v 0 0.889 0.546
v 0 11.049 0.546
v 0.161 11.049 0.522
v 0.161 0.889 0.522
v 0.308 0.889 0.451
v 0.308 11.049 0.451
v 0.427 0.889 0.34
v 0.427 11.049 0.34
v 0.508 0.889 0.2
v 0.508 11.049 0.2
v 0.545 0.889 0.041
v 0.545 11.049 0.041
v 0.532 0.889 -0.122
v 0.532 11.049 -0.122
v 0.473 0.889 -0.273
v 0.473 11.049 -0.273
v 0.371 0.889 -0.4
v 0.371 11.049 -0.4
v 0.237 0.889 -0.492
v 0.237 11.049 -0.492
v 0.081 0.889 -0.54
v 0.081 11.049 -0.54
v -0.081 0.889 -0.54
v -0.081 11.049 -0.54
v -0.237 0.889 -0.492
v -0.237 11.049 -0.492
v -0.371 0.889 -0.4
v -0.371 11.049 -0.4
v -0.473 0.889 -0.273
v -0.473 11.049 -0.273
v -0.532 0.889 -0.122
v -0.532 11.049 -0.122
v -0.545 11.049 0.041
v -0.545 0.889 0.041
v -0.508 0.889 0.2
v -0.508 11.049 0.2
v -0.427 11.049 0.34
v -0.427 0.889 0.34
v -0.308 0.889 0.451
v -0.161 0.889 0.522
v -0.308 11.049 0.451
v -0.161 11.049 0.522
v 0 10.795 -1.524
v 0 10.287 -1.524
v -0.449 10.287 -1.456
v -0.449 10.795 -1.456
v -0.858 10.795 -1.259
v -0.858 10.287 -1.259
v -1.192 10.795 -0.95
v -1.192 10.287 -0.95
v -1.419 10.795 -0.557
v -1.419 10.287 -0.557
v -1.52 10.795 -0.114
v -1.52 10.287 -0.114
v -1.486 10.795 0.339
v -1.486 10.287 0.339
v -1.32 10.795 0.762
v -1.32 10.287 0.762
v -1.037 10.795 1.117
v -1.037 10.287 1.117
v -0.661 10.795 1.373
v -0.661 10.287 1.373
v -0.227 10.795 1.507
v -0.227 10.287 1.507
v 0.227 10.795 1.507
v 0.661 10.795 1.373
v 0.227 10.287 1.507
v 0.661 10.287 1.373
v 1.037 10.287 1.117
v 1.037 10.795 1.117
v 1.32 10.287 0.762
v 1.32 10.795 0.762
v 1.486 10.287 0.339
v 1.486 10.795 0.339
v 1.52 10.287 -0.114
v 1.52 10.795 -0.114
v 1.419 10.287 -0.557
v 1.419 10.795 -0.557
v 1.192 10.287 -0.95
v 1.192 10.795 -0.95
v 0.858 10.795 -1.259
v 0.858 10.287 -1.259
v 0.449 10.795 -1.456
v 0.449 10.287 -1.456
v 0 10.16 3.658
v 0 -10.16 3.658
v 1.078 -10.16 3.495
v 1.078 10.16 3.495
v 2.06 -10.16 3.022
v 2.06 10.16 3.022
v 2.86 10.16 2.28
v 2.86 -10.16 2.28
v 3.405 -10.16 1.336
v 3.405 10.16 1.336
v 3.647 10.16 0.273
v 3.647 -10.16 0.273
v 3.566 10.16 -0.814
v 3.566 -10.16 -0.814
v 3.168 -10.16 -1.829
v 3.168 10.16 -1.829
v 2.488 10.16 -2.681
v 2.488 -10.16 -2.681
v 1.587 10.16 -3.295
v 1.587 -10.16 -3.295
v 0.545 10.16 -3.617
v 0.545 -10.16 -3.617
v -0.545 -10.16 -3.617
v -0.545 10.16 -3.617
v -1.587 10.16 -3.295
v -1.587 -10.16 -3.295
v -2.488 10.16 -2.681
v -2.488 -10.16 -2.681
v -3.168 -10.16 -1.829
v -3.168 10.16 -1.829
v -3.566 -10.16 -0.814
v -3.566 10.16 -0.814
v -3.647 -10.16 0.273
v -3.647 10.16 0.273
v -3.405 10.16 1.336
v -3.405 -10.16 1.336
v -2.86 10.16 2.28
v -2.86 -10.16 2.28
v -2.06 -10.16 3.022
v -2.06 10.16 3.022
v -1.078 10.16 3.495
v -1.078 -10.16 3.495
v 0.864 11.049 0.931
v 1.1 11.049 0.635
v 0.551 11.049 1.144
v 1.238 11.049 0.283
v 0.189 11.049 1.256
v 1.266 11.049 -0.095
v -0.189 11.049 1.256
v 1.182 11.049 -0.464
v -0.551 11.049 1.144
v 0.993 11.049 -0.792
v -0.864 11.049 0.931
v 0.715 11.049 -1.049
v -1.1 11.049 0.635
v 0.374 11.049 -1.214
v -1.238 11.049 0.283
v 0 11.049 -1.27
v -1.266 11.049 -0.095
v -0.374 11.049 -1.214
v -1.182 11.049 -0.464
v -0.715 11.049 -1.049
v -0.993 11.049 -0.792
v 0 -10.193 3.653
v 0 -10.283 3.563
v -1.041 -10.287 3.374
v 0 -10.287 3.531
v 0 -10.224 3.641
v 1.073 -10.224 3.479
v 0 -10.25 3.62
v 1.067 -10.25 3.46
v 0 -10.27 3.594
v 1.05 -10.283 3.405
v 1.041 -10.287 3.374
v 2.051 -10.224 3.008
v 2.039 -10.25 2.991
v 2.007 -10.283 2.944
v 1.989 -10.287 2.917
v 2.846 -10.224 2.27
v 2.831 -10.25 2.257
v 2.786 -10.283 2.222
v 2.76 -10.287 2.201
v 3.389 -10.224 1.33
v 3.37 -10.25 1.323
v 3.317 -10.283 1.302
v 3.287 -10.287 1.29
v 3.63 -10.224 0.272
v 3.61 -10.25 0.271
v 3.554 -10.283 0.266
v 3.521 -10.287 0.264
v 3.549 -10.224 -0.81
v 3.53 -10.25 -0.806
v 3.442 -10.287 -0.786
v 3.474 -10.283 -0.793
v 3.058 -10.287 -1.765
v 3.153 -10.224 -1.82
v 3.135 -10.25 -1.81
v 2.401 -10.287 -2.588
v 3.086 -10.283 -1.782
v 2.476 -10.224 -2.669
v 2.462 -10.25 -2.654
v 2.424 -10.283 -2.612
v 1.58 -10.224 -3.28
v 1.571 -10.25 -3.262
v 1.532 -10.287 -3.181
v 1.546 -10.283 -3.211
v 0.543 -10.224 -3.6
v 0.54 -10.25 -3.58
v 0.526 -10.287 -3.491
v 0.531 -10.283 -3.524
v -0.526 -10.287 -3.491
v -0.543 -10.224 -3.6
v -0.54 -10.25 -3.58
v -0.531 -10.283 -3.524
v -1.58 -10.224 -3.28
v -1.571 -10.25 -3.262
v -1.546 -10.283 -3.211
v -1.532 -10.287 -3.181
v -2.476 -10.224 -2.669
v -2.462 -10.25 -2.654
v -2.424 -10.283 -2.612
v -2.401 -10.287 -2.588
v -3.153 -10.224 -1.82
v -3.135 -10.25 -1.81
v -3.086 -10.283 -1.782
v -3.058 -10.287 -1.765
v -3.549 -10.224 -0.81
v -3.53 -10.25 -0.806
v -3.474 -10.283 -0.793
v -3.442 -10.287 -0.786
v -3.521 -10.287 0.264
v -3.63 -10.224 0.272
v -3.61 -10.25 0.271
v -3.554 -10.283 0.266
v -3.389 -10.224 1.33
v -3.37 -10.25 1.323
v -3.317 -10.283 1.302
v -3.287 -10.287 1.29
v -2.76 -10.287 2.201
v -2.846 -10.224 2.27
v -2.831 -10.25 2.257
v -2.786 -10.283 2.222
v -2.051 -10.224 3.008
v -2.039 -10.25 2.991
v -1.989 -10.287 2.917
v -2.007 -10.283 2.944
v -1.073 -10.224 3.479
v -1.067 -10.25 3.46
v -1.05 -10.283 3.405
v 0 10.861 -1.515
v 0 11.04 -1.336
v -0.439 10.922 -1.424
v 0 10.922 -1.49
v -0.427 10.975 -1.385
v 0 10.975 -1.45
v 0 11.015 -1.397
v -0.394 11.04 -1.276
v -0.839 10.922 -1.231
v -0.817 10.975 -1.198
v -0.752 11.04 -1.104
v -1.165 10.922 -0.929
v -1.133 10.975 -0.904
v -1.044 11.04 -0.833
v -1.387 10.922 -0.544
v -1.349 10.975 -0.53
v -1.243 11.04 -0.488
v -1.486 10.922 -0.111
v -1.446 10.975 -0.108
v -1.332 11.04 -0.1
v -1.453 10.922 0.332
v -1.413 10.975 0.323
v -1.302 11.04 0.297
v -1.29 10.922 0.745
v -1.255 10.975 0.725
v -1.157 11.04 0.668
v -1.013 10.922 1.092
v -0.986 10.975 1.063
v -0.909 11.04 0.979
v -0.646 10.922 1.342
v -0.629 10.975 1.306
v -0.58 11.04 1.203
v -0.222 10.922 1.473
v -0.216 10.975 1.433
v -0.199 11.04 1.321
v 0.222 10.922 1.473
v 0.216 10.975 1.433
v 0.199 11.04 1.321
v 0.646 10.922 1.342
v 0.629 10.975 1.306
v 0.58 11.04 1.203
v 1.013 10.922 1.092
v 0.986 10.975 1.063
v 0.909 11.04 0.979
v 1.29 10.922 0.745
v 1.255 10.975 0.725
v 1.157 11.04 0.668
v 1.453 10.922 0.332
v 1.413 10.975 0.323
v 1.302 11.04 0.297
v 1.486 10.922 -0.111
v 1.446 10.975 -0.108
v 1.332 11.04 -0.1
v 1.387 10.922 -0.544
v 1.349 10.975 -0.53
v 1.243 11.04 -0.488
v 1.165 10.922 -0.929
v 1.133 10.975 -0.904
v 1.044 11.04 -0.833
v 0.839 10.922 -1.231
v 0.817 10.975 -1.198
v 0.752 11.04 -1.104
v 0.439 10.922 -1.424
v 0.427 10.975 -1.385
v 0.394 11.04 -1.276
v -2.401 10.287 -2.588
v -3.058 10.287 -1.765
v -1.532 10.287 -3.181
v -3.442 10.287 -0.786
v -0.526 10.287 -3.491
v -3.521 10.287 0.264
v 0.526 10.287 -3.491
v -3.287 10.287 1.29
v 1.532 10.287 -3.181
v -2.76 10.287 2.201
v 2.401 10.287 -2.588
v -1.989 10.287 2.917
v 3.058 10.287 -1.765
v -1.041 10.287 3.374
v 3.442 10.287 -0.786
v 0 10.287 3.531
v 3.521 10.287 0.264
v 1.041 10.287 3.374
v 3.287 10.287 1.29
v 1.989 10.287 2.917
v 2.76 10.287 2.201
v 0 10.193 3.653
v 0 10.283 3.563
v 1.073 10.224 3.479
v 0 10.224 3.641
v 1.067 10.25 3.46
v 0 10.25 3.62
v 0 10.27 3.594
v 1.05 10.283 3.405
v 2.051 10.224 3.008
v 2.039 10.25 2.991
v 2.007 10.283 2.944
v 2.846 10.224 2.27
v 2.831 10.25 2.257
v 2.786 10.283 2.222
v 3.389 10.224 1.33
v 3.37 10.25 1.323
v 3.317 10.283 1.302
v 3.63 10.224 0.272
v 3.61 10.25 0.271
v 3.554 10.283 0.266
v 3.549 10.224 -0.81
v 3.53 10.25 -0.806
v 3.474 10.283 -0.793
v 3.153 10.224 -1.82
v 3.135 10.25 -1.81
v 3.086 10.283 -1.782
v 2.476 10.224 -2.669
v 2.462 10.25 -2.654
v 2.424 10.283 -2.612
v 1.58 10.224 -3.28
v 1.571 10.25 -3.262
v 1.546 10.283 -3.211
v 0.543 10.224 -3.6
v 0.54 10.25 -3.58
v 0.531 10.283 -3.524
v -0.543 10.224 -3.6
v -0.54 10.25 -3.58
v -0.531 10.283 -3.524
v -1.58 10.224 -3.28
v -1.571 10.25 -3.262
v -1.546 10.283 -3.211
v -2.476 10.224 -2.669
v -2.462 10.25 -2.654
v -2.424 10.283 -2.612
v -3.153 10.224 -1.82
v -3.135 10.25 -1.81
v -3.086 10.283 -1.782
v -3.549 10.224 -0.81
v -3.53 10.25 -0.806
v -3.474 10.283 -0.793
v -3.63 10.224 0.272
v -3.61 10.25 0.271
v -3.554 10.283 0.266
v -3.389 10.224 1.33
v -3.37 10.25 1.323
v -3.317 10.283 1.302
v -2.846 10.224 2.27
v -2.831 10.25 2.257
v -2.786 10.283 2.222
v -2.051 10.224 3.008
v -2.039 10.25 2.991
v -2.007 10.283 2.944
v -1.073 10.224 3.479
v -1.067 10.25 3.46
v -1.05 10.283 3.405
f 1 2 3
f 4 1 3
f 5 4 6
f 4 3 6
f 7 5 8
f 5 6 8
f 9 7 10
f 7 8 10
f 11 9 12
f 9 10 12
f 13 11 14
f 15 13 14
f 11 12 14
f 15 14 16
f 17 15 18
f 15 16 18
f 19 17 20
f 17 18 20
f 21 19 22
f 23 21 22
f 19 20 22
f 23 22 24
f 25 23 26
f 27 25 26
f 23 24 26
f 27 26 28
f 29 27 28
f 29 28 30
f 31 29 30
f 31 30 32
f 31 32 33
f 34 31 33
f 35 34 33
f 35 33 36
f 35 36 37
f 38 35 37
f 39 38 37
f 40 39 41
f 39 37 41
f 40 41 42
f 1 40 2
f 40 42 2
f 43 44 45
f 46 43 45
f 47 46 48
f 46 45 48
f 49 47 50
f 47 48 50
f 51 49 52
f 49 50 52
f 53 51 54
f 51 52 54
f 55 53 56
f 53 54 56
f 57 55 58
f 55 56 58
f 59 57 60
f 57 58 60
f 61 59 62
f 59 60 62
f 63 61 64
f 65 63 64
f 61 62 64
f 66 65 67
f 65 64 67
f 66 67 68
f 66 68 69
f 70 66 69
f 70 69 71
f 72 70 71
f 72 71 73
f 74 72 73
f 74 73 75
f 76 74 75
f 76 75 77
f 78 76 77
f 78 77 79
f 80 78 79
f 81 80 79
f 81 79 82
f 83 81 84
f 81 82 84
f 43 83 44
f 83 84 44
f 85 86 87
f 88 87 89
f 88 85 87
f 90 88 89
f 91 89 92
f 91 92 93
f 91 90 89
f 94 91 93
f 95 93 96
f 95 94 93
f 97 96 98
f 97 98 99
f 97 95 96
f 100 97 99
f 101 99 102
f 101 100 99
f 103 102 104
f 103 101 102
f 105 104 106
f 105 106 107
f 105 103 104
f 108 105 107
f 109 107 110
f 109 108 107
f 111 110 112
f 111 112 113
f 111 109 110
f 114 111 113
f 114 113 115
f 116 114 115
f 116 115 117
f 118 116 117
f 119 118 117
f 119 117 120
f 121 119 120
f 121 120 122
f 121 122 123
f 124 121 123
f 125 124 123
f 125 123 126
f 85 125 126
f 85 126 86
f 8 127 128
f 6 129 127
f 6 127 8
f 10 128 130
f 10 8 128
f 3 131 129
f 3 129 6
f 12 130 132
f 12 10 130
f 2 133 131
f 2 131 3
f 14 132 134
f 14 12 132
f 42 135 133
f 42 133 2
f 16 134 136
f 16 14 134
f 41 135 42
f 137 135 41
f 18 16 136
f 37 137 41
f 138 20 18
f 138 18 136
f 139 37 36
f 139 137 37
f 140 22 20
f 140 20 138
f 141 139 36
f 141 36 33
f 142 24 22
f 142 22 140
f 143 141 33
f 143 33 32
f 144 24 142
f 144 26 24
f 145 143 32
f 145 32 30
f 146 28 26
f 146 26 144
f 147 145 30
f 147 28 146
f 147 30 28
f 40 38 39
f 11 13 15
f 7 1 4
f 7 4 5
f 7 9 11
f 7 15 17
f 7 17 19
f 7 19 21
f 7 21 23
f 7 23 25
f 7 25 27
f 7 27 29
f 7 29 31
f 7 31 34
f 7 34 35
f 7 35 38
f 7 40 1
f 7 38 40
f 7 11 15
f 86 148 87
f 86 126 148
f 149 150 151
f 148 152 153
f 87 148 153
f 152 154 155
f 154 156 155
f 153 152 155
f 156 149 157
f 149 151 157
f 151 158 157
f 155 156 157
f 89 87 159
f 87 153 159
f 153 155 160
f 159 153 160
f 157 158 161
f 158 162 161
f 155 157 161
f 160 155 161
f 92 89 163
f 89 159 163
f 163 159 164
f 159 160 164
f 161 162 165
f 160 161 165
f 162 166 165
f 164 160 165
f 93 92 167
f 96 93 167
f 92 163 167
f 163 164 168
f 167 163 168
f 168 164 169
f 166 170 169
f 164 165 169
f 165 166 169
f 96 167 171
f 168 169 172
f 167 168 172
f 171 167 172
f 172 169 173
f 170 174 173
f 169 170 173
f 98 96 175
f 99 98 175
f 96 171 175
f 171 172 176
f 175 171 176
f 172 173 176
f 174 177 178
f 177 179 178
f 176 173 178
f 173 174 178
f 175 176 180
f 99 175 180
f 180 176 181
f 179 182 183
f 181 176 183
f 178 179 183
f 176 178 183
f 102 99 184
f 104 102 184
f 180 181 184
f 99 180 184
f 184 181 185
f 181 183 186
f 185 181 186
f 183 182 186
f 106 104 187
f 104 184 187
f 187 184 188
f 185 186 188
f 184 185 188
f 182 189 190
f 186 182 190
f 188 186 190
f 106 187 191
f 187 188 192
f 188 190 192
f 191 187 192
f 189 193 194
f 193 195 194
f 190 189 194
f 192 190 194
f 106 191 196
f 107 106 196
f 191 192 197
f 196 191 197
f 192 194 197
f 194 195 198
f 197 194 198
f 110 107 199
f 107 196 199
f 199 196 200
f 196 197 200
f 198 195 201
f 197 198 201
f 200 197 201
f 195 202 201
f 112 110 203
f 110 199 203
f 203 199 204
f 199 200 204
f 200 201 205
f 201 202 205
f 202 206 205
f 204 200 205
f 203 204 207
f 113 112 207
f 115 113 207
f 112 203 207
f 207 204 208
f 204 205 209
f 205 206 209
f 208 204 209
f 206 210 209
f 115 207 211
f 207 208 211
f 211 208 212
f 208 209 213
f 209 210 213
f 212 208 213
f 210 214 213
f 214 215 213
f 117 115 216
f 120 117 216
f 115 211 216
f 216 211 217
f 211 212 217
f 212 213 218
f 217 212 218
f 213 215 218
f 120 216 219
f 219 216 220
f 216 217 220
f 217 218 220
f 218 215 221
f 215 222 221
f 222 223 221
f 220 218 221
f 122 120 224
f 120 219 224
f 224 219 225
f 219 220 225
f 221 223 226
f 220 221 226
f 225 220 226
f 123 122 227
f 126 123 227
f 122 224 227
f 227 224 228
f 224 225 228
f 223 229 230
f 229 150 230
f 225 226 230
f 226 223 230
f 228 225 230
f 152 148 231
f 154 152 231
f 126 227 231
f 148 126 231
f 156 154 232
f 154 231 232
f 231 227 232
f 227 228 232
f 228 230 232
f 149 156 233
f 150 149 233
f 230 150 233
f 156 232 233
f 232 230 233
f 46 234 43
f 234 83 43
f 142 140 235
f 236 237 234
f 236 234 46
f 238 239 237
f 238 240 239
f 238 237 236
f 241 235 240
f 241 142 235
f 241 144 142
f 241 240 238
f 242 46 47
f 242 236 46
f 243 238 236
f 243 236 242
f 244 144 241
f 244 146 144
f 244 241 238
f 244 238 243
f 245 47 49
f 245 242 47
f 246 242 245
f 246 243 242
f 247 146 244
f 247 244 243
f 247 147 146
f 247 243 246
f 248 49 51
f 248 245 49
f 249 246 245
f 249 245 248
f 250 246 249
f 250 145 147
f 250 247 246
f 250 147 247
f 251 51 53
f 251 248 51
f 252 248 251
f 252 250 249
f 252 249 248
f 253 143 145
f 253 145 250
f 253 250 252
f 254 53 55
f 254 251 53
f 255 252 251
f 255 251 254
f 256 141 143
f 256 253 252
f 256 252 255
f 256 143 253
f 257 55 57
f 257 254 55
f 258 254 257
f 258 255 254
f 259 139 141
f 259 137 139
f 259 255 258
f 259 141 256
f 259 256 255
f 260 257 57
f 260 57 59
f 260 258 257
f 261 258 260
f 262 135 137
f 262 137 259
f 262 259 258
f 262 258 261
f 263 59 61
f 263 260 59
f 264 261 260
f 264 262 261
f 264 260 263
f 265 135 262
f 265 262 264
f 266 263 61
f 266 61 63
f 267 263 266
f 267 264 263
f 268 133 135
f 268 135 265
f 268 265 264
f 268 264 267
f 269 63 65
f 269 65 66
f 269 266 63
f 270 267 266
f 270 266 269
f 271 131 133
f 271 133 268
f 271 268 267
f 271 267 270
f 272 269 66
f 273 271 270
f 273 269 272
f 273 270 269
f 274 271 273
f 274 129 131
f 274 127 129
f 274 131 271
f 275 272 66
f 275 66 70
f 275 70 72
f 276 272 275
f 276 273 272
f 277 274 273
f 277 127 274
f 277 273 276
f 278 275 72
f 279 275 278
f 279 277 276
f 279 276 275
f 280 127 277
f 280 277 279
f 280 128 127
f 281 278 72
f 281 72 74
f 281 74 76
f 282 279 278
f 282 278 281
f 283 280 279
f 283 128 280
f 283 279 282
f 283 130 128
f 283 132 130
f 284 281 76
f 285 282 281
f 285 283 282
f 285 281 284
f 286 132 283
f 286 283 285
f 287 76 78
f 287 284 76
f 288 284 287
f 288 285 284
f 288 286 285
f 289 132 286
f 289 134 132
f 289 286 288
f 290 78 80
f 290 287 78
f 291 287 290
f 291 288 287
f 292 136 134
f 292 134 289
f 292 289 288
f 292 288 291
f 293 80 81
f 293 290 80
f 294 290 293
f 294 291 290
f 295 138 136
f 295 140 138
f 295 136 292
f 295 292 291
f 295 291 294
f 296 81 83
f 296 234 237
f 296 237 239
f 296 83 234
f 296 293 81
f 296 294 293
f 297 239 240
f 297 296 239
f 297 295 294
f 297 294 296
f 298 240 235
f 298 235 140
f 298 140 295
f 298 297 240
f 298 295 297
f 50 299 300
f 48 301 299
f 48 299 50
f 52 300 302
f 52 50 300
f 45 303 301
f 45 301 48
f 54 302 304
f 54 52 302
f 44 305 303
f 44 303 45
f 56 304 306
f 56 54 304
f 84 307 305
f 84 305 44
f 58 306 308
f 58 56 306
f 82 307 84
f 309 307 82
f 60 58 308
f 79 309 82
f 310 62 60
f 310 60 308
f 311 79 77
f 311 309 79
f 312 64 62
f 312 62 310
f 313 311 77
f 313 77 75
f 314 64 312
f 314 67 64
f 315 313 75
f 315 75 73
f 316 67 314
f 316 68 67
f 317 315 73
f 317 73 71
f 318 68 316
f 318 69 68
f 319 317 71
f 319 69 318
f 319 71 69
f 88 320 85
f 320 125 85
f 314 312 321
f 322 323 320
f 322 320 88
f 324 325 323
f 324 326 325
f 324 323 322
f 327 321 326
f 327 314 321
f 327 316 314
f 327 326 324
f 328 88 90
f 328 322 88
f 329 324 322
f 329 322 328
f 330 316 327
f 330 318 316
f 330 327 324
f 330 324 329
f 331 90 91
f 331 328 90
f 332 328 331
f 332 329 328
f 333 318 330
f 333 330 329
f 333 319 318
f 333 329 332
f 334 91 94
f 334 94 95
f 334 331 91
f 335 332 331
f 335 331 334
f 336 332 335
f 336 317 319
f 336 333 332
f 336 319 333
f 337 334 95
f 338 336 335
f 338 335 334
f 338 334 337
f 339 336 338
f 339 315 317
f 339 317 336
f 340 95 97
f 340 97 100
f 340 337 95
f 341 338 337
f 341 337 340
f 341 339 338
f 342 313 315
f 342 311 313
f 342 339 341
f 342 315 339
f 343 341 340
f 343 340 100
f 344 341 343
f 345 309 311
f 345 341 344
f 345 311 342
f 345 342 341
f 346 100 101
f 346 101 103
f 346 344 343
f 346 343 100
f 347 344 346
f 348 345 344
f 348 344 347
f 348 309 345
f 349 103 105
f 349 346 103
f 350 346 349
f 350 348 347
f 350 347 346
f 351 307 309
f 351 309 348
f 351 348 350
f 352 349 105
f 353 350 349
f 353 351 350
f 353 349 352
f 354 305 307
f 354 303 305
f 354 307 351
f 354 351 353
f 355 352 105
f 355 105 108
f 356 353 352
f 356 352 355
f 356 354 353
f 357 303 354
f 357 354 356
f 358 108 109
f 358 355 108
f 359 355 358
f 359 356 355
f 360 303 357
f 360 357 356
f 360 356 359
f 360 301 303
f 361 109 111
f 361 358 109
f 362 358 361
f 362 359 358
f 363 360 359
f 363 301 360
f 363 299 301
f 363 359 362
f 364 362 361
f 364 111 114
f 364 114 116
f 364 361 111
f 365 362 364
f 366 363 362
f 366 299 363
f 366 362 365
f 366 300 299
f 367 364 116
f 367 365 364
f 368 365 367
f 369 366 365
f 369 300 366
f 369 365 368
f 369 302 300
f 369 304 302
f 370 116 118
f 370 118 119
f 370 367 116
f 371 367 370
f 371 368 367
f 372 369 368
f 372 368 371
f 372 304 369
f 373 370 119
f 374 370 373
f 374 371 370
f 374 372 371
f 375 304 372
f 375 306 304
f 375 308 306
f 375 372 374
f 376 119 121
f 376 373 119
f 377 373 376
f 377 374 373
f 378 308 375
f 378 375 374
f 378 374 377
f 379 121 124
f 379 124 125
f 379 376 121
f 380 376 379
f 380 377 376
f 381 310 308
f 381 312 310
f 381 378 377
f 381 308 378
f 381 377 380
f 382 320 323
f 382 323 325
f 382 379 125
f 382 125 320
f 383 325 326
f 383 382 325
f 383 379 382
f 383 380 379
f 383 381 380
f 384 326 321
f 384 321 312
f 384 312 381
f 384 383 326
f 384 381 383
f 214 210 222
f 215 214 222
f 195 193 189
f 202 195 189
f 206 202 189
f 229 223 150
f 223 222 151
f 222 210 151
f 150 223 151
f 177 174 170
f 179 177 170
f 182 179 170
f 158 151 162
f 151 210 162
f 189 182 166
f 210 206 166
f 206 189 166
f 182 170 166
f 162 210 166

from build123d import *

# Parameters (mm, degrees)
SKETCH1_R           = 3.6576
BOSS_EXTRUDE1_DEPTH = 10.287
FILLET1_R           = 0.127
SKETCH2_R           = 1.524
BOSS_EXTRUDE2_DEPTH = 0.762
FILLET2_R           = 0.254
SKETCH3_R           = 0.5461
CUT_EXTRUDE1_DEPTH  = 10.16


with BuildPart() as part:
    # Sketch1 → Boss-Extrude1 (new, symmetric)
    with BuildSketch(Plane(origin=(0, 0, 0), x_dir=(1, 0, 0), z_dir=(0, 1, 0))):
        with Locations(Location((0, 0, 0), (0, 0, 270))):
            Circle(SKETCH1_R)
    extrude(amount=BOSS_EXTRUDE1_DEPTH, both=True)

    # Fillet1
    fillet1_edges = [part.edges().sort_by_distance(p)[0] for p in [
        (0, -10.287, -3.6576),
        (0, 10.287, -3.6576),
    ]]
    fillet(fillet1_edges, radius=FILLET1_R)

    # Sketch2 → Boss-Extrude2 (add)
    with BuildSketch(Plane(origin=(0, 10.287, 0), x_dir=(1, 0, 0), z_dir=(0, 1, 0))):
        with Locations(Location((0, 0, 0), (0, 0, 90))):
            Circle(SKETCH2_R)
    extrude(amount=BOSS_EXTRUDE2_DEPTH)

    # Fillet2
    fillet2_edges = [part.edges().sort_by_distance(p)[0] for p in [
        (0, 11.049, 1.524),
    ]]
    fillet(fillet2_edges, radius=FILLET2_R)

    # Sketch3 → Cut-Extrude1 (cut)
    with BuildSketch(Plane(origin=(0, 11.049, 0), x_dir=(1, 0, 0), z_dir=(0, 1, 0))):
        with Locations(Location((0, 0, 0), (0, 0, 270))):
            Circle(SKETCH3_R)
    extrude(amount=-CUT_EXTRUDE1_DEPTH, mode=Mode.SUBTRACT)


solid = part.part
